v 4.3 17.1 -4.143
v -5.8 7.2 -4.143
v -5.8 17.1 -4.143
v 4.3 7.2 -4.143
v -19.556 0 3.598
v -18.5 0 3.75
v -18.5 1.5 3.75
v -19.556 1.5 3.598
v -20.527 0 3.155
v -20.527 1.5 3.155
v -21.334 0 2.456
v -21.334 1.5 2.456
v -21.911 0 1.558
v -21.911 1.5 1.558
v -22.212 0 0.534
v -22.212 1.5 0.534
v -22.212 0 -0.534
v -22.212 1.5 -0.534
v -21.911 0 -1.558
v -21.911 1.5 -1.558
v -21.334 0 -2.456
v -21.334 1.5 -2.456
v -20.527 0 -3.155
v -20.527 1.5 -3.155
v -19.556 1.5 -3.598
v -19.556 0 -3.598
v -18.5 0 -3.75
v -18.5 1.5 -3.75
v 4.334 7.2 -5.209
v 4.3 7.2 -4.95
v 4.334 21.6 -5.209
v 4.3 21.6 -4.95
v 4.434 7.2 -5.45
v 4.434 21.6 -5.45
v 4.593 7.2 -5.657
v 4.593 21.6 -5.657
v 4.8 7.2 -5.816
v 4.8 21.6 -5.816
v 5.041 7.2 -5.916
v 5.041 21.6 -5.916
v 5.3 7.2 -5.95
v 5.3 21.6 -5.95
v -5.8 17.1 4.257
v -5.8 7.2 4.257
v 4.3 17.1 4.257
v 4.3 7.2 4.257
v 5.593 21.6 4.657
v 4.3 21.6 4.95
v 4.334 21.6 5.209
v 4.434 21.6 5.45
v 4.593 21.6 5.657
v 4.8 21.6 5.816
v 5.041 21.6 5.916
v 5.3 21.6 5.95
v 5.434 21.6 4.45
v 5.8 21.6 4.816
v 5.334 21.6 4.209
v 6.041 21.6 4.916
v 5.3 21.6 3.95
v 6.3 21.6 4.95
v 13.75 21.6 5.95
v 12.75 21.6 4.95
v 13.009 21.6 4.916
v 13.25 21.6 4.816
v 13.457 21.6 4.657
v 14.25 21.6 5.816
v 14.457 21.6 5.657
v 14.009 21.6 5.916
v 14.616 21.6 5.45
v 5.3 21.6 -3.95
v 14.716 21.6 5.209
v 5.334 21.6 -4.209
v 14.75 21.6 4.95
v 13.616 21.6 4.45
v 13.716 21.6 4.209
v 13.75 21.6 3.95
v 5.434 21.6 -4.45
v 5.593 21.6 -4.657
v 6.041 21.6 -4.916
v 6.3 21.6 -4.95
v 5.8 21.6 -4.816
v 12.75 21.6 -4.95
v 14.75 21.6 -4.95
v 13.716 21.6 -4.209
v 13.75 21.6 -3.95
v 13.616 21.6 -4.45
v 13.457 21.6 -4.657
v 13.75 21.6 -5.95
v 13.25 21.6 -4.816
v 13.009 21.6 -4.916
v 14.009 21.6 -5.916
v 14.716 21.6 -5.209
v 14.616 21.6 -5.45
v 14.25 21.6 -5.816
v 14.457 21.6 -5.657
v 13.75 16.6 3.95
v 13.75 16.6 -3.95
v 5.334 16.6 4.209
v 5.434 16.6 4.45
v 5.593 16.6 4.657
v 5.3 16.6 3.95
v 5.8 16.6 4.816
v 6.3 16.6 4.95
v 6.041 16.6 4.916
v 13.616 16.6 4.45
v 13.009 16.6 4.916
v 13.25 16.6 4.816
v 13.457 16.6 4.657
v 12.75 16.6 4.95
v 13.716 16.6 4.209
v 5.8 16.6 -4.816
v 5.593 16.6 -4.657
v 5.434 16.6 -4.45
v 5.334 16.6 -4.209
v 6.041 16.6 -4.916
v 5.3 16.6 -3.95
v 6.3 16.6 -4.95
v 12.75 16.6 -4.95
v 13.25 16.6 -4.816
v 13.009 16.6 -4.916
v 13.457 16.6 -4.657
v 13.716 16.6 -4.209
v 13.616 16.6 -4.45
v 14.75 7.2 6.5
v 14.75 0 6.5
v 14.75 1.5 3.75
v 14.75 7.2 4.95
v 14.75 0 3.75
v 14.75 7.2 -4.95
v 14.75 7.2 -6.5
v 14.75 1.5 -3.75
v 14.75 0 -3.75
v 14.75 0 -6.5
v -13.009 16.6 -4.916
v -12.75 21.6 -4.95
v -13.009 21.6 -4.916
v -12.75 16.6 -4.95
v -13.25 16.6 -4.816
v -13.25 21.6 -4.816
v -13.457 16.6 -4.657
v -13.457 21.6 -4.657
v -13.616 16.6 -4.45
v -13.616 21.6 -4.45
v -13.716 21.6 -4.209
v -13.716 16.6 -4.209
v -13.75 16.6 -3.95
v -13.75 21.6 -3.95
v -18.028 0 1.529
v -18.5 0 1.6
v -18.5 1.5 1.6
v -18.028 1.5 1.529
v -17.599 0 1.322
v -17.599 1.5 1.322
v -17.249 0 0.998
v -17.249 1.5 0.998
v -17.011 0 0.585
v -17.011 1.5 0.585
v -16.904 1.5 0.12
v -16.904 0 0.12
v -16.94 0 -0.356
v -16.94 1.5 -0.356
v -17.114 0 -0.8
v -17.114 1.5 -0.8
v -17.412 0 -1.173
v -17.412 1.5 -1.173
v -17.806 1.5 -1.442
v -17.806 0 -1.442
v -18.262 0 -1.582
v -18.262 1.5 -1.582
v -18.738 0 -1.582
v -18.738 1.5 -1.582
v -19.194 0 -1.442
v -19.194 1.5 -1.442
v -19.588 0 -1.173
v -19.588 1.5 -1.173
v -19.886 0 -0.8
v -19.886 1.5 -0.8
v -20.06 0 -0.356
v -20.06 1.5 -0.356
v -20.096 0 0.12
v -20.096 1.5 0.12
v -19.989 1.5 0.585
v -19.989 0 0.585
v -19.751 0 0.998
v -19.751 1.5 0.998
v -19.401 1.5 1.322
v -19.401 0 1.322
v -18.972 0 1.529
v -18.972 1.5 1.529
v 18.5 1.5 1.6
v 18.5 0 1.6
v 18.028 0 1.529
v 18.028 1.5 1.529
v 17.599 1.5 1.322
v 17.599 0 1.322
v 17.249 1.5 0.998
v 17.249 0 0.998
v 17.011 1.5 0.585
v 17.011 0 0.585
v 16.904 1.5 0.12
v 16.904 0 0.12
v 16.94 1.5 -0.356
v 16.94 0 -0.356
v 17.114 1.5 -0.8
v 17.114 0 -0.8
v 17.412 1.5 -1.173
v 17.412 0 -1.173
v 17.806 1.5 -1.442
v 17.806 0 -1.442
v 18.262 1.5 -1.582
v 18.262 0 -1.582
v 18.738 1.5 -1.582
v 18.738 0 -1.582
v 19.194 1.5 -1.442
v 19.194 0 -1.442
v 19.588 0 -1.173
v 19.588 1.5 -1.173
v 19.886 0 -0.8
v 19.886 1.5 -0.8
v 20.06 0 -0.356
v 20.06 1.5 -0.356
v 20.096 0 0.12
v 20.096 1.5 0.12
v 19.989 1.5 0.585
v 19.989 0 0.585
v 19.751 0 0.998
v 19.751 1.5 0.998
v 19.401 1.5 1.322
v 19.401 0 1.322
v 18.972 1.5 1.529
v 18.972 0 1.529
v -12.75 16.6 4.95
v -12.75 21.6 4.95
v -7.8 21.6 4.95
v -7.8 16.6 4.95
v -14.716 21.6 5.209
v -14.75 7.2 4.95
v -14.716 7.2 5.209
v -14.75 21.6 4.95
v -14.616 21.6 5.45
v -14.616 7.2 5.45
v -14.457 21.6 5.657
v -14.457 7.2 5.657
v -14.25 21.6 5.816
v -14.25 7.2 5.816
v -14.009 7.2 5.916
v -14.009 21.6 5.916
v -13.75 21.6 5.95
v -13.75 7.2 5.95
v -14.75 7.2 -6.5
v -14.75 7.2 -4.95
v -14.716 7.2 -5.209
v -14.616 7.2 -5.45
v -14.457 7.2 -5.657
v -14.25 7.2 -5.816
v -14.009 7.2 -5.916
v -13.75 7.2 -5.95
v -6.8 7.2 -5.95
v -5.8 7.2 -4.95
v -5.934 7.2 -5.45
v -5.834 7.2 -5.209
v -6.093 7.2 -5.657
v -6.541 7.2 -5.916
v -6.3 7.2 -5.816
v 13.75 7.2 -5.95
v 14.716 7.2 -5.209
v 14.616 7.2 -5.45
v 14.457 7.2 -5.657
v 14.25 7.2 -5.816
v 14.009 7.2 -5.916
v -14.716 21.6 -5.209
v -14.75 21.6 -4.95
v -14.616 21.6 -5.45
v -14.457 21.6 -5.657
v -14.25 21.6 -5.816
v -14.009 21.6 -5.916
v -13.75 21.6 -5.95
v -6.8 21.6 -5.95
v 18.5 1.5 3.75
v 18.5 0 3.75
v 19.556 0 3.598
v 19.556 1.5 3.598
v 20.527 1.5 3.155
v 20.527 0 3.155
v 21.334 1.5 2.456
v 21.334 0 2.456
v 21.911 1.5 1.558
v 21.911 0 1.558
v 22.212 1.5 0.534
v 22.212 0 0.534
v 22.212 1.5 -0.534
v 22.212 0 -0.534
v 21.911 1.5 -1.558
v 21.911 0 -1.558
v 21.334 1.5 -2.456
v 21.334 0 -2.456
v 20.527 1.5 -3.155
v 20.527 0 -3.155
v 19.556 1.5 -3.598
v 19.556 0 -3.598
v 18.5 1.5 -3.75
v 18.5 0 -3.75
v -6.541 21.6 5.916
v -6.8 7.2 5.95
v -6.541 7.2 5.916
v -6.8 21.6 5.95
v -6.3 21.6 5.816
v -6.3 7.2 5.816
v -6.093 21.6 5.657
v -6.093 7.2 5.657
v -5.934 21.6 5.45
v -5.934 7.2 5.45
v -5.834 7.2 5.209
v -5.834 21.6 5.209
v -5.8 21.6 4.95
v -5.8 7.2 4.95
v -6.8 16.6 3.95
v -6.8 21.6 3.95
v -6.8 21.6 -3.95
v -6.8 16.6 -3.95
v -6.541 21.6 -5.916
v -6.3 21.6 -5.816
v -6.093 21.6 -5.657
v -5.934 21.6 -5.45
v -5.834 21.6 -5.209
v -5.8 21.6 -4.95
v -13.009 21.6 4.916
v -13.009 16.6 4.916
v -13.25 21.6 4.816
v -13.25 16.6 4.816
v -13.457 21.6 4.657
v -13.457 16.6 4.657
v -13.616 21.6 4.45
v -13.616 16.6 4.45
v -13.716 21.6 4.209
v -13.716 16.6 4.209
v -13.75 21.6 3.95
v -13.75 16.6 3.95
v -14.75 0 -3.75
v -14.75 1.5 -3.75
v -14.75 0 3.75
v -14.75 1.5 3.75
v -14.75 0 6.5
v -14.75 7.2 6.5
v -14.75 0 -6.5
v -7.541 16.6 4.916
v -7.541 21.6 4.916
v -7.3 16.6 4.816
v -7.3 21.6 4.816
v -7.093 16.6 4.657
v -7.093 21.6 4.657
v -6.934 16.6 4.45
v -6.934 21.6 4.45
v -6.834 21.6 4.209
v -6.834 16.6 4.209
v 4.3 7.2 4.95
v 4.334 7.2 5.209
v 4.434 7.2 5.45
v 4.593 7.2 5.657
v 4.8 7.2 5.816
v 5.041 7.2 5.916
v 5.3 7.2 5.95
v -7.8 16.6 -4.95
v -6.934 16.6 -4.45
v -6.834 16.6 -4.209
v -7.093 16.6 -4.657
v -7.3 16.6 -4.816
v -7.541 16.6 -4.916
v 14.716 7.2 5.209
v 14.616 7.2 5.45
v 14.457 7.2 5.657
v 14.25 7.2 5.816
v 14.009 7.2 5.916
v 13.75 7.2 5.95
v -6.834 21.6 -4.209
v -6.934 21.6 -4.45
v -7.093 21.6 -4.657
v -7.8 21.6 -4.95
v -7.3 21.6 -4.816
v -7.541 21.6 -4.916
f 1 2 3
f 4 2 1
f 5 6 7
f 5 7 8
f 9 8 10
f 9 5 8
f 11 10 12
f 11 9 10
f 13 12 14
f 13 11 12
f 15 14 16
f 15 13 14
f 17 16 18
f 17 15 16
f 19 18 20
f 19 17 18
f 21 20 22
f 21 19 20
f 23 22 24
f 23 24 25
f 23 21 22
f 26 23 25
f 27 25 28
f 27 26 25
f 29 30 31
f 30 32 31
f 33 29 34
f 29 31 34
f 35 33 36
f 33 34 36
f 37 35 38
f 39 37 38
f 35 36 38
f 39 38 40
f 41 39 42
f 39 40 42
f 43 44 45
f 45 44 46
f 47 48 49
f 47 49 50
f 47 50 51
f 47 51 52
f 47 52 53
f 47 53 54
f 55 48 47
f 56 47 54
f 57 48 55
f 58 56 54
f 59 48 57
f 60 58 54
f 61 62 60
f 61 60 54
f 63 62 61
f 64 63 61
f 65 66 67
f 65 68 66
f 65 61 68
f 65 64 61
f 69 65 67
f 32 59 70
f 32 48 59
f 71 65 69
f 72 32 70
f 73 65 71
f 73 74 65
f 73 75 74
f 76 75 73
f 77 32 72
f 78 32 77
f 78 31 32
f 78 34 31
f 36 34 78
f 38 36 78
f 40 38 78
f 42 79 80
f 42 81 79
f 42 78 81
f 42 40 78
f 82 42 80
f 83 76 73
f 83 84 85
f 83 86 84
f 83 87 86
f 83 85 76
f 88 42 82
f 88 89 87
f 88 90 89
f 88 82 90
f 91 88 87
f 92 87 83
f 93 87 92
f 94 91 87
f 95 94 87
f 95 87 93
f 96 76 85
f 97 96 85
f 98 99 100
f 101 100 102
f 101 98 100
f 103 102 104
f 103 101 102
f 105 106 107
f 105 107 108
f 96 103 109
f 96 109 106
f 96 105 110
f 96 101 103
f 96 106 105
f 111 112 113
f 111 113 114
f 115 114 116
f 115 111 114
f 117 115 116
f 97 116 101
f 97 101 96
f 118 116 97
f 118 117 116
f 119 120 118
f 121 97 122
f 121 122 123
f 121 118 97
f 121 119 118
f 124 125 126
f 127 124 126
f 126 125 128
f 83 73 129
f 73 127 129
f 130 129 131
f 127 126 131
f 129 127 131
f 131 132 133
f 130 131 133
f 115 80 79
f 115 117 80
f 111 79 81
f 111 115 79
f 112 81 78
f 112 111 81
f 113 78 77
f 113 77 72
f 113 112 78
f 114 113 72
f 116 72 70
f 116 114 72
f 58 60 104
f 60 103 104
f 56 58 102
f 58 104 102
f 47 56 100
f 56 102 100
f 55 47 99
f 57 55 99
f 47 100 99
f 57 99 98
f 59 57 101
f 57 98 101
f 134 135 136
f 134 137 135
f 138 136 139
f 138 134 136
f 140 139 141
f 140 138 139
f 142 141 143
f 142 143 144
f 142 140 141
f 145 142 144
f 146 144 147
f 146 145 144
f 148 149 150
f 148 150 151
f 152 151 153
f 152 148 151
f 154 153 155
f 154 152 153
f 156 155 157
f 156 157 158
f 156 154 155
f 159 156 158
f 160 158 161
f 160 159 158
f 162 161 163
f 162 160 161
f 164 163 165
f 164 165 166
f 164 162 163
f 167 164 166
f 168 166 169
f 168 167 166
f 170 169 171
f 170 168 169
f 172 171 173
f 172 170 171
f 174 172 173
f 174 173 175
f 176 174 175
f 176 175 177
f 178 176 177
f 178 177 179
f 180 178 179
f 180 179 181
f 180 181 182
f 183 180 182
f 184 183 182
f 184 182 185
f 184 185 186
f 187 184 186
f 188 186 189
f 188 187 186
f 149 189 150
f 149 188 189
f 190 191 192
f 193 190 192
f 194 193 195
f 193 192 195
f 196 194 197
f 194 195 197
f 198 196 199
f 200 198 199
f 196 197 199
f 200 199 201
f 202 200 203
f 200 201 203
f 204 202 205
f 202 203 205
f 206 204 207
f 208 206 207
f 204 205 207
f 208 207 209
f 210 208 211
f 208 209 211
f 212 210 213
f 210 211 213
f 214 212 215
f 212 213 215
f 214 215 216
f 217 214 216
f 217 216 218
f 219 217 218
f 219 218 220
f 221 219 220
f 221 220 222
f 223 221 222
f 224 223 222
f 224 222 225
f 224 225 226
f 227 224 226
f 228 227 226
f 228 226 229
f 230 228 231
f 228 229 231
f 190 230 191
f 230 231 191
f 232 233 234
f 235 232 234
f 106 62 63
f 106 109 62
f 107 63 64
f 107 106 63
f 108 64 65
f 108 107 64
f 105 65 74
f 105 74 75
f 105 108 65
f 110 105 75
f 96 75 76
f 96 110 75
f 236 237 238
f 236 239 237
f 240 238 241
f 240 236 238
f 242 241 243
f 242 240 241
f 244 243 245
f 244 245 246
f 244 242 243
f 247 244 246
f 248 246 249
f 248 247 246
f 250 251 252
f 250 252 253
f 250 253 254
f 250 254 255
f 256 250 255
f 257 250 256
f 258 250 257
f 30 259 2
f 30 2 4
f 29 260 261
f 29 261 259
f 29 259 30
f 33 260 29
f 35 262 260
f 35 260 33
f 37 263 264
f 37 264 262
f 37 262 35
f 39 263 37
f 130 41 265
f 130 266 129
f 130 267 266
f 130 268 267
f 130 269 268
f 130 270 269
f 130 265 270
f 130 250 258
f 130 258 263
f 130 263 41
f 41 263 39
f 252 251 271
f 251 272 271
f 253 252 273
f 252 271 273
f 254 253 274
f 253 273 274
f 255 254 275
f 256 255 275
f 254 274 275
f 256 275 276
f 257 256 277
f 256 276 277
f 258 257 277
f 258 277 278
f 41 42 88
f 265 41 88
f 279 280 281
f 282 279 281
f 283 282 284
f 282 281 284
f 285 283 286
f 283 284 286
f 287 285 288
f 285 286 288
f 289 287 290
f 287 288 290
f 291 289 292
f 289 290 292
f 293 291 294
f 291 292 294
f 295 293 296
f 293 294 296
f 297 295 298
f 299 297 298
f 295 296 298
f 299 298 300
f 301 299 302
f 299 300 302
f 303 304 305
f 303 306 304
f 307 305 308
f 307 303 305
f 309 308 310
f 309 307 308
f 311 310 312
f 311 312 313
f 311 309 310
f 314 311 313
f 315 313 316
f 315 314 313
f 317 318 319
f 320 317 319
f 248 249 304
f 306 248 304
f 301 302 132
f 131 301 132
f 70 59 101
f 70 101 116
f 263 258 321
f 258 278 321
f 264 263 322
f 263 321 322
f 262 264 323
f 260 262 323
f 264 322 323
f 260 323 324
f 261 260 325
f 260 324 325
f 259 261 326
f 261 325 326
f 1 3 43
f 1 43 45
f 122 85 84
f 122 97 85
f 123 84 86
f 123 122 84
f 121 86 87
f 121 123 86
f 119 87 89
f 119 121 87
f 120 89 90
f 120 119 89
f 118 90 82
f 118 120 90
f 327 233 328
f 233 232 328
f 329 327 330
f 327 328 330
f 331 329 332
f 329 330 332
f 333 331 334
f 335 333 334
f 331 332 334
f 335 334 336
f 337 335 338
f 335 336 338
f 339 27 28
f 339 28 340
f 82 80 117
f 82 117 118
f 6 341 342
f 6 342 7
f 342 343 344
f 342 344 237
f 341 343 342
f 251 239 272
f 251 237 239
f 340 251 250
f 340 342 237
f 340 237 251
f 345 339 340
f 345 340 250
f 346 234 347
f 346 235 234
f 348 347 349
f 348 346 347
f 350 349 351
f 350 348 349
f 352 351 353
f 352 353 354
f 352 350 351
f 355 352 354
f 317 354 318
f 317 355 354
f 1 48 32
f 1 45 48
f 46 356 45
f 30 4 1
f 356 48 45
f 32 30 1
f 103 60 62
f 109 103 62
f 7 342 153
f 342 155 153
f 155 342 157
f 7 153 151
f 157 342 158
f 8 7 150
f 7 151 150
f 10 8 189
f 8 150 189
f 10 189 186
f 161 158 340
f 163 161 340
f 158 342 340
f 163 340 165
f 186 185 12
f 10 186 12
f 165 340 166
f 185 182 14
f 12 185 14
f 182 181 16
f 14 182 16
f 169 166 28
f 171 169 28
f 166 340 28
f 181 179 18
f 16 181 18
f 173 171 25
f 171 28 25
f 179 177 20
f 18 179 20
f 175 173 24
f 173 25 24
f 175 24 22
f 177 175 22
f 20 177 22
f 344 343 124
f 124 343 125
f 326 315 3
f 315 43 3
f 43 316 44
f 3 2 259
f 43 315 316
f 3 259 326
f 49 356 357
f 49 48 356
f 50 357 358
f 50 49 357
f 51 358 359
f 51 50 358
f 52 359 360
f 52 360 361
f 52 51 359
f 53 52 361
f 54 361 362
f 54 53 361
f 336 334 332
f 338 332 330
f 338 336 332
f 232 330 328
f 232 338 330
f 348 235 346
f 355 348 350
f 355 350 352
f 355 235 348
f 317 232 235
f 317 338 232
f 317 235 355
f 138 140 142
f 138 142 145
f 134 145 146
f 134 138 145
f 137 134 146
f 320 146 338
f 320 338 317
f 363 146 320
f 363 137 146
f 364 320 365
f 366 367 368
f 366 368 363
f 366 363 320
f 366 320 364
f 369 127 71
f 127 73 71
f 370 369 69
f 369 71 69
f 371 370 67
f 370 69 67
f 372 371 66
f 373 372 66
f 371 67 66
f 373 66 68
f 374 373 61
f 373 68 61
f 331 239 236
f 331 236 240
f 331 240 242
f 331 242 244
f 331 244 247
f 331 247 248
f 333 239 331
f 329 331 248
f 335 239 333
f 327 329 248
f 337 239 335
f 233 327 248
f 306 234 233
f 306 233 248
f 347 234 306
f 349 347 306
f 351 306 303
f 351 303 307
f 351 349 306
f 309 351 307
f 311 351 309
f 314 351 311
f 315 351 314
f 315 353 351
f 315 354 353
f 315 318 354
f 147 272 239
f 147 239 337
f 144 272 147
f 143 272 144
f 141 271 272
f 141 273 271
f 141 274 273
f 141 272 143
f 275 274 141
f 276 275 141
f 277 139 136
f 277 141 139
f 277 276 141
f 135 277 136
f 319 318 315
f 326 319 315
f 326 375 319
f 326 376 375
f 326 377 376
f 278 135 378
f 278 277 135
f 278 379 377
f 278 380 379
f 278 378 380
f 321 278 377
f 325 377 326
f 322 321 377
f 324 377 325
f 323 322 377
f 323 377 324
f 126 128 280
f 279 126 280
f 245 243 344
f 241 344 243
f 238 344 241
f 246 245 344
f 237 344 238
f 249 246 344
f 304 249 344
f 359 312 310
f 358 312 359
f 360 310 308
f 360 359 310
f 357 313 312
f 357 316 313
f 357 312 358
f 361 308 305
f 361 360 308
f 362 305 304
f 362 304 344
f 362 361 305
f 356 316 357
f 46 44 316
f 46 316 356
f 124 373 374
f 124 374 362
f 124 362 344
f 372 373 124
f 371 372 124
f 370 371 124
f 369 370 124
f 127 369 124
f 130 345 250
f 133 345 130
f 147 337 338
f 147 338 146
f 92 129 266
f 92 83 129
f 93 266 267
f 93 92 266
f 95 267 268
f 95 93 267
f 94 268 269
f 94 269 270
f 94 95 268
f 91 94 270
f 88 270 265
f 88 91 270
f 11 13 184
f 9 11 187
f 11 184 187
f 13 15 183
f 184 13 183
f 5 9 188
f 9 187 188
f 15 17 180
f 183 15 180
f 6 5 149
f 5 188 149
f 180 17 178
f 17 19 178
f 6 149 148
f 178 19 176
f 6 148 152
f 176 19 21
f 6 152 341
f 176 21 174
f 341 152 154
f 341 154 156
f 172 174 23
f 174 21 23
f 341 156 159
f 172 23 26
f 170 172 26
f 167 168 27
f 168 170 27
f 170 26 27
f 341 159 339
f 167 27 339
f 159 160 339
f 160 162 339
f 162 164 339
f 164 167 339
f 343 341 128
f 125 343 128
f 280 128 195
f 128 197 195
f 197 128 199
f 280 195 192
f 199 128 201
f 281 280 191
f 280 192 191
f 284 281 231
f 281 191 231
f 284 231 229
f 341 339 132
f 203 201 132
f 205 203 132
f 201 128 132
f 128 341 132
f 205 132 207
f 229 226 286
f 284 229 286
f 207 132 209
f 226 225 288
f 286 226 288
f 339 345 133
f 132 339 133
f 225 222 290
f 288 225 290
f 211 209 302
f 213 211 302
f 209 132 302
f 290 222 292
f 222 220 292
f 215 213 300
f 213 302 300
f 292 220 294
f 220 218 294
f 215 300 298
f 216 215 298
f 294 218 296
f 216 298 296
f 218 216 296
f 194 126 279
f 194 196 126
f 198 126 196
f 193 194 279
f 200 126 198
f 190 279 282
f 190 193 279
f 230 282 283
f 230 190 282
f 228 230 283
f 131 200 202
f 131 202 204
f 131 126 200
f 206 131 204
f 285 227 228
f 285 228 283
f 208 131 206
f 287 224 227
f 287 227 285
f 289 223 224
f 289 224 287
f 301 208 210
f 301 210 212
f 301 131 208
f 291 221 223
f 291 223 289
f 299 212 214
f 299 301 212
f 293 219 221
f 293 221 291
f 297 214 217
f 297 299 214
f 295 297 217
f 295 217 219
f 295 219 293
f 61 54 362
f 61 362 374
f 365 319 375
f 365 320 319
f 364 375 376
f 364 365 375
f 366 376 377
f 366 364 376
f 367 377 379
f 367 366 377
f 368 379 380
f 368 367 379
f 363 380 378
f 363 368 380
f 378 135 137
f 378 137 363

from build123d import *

# Parameters (mm, degrees)
SKETCH3_W           = 29.5
SKETCH3_H           = 13
BOSS_EXTRUDE2_DEPTH = 7.2
SKETCH5_R           = 1.6
BOSS_EXTRUDE3_DEPTH = 1.5
SKETCH9_W           = 8.95
SKETCH9_H           = 11.9
SKETCH9_W_2         = 10.45
BOSS_EXTRUDE4_DEPTH = 14.4
SKETCH10_W          = 10.1
SKETCH10_H          = 8.4
BOSS_EXTRUDE5_DEPTH = 9.9
SKETCH11_W          = 6.95
SKETCH11_H          = 9.9
SKETCH11_W_2        = 8.45
CUT_EXTRUDE2_DEPTH  = 5
FILLET2_R           = 1


with BuildPart() as part:
    # Sketch3 → Boss-Extrude2 (new body)
    with BuildSketch(Plane(origin=(0, 0, 0), x_dir=(1, 0, 0), z_dir=(0, 1, 0))):
        Rectangle(SKETCH3_W, SKETCH3_H)
    extrude(amount=BOSS_EXTRUDE2_DEPTH)

    # Sketch5 → Boss-Extrude3 (add)
    with BuildSketch(Plane(origin=(0, 0, 0), x_dir=(1, 0, 0), z_dir=(0, 1, 0))):
        with BuildLine():
            Line((-18.5, 3.75), (-14.75, 3.75))
            Line((-14.75, 3.75), (-14.75, -3.75))
            Line((-14.75, -3.75), (-18.5, -3.75))
            ThreePointArc((-18.5, -3.75), (-22.25, 0), (-18.5, 3.75))
        make_face()
        with Locations(Location((-18.5, 0, 0), (0, 0, 270))):
            Circle(SKETCH5_R, mode=Mode.SUBTRACT)
    boss_extrude3 = extrude(amount=BOSS_EXTRUDE3_DEPTH)

    # Mirror1: Boss-Extrude3 across plane
    add(boss_extrude3.mirror(Plane(origin=(0, 0, 0), x_dir=(0, 0, 1), z_dir=(1, 0, 0))))

    # Sketch9 → Boss-Extrude4 (add)
    with BuildSketch(Plane(origin=(0, 7.2, 0), x_dir=(1, 0, 0), z_dir=(0, 1, 0))):
        with Locations((-10.275, 0)):
            Rectangle(SKETCH9_W, SKETCH9_H)
        with Locations((9.525, 0)):
            Rectangle(SKETCH9_W_2, SKETCH9_H)
    extrude(amount=BOSS_EXTRUDE4_DEPTH)

    # Sketch10 → Boss-Extrude5 (add)
    with BuildSketch(Plane(origin=(0, 7.2, 0), x_dir=(1, 0, 0), z_dir=(0, 1, 0))):
        with Locations((-0.75, -0.057461808)):
            Rectangle(SKETCH10_W, SKETCH10_H)
    extrude(amount=BOSS_EXTRUDE5_DEPTH)

    # Sketch11 → Cut-Extrude2 (cut)
    with BuildSketch(Plane(origin=(0, 21.6, 0), x_dir=(1, 0, 0), z_dir=(0, 1, 0))):
        with Locations((-10.275, 0)):
            Rectangle(SKETCH11_W, SKETCH11_H)
        with Locations((9.525, 0)):
            Rectangle(SKETCH11_W_2, SKETCH11_H)
    extrude(amount=-CUT_EXTRUDE2_DEPTH, mode=Mode.SUBTRACT)

    # Fillet2
    fillet2_edges = [part.edges().sort_by_distance(p)[0] for p in [
        (-14.75, 14.4, -5.95),
        (-14.75, 14.4, 5.95),
        (-5.8, 14.4, 5.95),
        (-5.8, 14.4, -5.95),
        (14.75, 14.4, 5.95),
        (14.75, 14.4, -5.95),
        (4.3, 14.4, -5.95),
        (4.3, 14.4, 5.95),
        (-13.75, 19.1, 4.95),
        (-13.75, 19.1, -4.95),
        (-6.8, 19.1, -4.95),
        (-6.8, 19.1, 4.95),
        (5.3, 19.1, 4.95),
        (5.3, 19.1, -4.95),
        (13.75, 19.1, -4.95),
        (13.75, 19.1, 4.95),
    ]]
    fillet(fillet2_edges, radius=FILLET2_R)


solid = part.part
